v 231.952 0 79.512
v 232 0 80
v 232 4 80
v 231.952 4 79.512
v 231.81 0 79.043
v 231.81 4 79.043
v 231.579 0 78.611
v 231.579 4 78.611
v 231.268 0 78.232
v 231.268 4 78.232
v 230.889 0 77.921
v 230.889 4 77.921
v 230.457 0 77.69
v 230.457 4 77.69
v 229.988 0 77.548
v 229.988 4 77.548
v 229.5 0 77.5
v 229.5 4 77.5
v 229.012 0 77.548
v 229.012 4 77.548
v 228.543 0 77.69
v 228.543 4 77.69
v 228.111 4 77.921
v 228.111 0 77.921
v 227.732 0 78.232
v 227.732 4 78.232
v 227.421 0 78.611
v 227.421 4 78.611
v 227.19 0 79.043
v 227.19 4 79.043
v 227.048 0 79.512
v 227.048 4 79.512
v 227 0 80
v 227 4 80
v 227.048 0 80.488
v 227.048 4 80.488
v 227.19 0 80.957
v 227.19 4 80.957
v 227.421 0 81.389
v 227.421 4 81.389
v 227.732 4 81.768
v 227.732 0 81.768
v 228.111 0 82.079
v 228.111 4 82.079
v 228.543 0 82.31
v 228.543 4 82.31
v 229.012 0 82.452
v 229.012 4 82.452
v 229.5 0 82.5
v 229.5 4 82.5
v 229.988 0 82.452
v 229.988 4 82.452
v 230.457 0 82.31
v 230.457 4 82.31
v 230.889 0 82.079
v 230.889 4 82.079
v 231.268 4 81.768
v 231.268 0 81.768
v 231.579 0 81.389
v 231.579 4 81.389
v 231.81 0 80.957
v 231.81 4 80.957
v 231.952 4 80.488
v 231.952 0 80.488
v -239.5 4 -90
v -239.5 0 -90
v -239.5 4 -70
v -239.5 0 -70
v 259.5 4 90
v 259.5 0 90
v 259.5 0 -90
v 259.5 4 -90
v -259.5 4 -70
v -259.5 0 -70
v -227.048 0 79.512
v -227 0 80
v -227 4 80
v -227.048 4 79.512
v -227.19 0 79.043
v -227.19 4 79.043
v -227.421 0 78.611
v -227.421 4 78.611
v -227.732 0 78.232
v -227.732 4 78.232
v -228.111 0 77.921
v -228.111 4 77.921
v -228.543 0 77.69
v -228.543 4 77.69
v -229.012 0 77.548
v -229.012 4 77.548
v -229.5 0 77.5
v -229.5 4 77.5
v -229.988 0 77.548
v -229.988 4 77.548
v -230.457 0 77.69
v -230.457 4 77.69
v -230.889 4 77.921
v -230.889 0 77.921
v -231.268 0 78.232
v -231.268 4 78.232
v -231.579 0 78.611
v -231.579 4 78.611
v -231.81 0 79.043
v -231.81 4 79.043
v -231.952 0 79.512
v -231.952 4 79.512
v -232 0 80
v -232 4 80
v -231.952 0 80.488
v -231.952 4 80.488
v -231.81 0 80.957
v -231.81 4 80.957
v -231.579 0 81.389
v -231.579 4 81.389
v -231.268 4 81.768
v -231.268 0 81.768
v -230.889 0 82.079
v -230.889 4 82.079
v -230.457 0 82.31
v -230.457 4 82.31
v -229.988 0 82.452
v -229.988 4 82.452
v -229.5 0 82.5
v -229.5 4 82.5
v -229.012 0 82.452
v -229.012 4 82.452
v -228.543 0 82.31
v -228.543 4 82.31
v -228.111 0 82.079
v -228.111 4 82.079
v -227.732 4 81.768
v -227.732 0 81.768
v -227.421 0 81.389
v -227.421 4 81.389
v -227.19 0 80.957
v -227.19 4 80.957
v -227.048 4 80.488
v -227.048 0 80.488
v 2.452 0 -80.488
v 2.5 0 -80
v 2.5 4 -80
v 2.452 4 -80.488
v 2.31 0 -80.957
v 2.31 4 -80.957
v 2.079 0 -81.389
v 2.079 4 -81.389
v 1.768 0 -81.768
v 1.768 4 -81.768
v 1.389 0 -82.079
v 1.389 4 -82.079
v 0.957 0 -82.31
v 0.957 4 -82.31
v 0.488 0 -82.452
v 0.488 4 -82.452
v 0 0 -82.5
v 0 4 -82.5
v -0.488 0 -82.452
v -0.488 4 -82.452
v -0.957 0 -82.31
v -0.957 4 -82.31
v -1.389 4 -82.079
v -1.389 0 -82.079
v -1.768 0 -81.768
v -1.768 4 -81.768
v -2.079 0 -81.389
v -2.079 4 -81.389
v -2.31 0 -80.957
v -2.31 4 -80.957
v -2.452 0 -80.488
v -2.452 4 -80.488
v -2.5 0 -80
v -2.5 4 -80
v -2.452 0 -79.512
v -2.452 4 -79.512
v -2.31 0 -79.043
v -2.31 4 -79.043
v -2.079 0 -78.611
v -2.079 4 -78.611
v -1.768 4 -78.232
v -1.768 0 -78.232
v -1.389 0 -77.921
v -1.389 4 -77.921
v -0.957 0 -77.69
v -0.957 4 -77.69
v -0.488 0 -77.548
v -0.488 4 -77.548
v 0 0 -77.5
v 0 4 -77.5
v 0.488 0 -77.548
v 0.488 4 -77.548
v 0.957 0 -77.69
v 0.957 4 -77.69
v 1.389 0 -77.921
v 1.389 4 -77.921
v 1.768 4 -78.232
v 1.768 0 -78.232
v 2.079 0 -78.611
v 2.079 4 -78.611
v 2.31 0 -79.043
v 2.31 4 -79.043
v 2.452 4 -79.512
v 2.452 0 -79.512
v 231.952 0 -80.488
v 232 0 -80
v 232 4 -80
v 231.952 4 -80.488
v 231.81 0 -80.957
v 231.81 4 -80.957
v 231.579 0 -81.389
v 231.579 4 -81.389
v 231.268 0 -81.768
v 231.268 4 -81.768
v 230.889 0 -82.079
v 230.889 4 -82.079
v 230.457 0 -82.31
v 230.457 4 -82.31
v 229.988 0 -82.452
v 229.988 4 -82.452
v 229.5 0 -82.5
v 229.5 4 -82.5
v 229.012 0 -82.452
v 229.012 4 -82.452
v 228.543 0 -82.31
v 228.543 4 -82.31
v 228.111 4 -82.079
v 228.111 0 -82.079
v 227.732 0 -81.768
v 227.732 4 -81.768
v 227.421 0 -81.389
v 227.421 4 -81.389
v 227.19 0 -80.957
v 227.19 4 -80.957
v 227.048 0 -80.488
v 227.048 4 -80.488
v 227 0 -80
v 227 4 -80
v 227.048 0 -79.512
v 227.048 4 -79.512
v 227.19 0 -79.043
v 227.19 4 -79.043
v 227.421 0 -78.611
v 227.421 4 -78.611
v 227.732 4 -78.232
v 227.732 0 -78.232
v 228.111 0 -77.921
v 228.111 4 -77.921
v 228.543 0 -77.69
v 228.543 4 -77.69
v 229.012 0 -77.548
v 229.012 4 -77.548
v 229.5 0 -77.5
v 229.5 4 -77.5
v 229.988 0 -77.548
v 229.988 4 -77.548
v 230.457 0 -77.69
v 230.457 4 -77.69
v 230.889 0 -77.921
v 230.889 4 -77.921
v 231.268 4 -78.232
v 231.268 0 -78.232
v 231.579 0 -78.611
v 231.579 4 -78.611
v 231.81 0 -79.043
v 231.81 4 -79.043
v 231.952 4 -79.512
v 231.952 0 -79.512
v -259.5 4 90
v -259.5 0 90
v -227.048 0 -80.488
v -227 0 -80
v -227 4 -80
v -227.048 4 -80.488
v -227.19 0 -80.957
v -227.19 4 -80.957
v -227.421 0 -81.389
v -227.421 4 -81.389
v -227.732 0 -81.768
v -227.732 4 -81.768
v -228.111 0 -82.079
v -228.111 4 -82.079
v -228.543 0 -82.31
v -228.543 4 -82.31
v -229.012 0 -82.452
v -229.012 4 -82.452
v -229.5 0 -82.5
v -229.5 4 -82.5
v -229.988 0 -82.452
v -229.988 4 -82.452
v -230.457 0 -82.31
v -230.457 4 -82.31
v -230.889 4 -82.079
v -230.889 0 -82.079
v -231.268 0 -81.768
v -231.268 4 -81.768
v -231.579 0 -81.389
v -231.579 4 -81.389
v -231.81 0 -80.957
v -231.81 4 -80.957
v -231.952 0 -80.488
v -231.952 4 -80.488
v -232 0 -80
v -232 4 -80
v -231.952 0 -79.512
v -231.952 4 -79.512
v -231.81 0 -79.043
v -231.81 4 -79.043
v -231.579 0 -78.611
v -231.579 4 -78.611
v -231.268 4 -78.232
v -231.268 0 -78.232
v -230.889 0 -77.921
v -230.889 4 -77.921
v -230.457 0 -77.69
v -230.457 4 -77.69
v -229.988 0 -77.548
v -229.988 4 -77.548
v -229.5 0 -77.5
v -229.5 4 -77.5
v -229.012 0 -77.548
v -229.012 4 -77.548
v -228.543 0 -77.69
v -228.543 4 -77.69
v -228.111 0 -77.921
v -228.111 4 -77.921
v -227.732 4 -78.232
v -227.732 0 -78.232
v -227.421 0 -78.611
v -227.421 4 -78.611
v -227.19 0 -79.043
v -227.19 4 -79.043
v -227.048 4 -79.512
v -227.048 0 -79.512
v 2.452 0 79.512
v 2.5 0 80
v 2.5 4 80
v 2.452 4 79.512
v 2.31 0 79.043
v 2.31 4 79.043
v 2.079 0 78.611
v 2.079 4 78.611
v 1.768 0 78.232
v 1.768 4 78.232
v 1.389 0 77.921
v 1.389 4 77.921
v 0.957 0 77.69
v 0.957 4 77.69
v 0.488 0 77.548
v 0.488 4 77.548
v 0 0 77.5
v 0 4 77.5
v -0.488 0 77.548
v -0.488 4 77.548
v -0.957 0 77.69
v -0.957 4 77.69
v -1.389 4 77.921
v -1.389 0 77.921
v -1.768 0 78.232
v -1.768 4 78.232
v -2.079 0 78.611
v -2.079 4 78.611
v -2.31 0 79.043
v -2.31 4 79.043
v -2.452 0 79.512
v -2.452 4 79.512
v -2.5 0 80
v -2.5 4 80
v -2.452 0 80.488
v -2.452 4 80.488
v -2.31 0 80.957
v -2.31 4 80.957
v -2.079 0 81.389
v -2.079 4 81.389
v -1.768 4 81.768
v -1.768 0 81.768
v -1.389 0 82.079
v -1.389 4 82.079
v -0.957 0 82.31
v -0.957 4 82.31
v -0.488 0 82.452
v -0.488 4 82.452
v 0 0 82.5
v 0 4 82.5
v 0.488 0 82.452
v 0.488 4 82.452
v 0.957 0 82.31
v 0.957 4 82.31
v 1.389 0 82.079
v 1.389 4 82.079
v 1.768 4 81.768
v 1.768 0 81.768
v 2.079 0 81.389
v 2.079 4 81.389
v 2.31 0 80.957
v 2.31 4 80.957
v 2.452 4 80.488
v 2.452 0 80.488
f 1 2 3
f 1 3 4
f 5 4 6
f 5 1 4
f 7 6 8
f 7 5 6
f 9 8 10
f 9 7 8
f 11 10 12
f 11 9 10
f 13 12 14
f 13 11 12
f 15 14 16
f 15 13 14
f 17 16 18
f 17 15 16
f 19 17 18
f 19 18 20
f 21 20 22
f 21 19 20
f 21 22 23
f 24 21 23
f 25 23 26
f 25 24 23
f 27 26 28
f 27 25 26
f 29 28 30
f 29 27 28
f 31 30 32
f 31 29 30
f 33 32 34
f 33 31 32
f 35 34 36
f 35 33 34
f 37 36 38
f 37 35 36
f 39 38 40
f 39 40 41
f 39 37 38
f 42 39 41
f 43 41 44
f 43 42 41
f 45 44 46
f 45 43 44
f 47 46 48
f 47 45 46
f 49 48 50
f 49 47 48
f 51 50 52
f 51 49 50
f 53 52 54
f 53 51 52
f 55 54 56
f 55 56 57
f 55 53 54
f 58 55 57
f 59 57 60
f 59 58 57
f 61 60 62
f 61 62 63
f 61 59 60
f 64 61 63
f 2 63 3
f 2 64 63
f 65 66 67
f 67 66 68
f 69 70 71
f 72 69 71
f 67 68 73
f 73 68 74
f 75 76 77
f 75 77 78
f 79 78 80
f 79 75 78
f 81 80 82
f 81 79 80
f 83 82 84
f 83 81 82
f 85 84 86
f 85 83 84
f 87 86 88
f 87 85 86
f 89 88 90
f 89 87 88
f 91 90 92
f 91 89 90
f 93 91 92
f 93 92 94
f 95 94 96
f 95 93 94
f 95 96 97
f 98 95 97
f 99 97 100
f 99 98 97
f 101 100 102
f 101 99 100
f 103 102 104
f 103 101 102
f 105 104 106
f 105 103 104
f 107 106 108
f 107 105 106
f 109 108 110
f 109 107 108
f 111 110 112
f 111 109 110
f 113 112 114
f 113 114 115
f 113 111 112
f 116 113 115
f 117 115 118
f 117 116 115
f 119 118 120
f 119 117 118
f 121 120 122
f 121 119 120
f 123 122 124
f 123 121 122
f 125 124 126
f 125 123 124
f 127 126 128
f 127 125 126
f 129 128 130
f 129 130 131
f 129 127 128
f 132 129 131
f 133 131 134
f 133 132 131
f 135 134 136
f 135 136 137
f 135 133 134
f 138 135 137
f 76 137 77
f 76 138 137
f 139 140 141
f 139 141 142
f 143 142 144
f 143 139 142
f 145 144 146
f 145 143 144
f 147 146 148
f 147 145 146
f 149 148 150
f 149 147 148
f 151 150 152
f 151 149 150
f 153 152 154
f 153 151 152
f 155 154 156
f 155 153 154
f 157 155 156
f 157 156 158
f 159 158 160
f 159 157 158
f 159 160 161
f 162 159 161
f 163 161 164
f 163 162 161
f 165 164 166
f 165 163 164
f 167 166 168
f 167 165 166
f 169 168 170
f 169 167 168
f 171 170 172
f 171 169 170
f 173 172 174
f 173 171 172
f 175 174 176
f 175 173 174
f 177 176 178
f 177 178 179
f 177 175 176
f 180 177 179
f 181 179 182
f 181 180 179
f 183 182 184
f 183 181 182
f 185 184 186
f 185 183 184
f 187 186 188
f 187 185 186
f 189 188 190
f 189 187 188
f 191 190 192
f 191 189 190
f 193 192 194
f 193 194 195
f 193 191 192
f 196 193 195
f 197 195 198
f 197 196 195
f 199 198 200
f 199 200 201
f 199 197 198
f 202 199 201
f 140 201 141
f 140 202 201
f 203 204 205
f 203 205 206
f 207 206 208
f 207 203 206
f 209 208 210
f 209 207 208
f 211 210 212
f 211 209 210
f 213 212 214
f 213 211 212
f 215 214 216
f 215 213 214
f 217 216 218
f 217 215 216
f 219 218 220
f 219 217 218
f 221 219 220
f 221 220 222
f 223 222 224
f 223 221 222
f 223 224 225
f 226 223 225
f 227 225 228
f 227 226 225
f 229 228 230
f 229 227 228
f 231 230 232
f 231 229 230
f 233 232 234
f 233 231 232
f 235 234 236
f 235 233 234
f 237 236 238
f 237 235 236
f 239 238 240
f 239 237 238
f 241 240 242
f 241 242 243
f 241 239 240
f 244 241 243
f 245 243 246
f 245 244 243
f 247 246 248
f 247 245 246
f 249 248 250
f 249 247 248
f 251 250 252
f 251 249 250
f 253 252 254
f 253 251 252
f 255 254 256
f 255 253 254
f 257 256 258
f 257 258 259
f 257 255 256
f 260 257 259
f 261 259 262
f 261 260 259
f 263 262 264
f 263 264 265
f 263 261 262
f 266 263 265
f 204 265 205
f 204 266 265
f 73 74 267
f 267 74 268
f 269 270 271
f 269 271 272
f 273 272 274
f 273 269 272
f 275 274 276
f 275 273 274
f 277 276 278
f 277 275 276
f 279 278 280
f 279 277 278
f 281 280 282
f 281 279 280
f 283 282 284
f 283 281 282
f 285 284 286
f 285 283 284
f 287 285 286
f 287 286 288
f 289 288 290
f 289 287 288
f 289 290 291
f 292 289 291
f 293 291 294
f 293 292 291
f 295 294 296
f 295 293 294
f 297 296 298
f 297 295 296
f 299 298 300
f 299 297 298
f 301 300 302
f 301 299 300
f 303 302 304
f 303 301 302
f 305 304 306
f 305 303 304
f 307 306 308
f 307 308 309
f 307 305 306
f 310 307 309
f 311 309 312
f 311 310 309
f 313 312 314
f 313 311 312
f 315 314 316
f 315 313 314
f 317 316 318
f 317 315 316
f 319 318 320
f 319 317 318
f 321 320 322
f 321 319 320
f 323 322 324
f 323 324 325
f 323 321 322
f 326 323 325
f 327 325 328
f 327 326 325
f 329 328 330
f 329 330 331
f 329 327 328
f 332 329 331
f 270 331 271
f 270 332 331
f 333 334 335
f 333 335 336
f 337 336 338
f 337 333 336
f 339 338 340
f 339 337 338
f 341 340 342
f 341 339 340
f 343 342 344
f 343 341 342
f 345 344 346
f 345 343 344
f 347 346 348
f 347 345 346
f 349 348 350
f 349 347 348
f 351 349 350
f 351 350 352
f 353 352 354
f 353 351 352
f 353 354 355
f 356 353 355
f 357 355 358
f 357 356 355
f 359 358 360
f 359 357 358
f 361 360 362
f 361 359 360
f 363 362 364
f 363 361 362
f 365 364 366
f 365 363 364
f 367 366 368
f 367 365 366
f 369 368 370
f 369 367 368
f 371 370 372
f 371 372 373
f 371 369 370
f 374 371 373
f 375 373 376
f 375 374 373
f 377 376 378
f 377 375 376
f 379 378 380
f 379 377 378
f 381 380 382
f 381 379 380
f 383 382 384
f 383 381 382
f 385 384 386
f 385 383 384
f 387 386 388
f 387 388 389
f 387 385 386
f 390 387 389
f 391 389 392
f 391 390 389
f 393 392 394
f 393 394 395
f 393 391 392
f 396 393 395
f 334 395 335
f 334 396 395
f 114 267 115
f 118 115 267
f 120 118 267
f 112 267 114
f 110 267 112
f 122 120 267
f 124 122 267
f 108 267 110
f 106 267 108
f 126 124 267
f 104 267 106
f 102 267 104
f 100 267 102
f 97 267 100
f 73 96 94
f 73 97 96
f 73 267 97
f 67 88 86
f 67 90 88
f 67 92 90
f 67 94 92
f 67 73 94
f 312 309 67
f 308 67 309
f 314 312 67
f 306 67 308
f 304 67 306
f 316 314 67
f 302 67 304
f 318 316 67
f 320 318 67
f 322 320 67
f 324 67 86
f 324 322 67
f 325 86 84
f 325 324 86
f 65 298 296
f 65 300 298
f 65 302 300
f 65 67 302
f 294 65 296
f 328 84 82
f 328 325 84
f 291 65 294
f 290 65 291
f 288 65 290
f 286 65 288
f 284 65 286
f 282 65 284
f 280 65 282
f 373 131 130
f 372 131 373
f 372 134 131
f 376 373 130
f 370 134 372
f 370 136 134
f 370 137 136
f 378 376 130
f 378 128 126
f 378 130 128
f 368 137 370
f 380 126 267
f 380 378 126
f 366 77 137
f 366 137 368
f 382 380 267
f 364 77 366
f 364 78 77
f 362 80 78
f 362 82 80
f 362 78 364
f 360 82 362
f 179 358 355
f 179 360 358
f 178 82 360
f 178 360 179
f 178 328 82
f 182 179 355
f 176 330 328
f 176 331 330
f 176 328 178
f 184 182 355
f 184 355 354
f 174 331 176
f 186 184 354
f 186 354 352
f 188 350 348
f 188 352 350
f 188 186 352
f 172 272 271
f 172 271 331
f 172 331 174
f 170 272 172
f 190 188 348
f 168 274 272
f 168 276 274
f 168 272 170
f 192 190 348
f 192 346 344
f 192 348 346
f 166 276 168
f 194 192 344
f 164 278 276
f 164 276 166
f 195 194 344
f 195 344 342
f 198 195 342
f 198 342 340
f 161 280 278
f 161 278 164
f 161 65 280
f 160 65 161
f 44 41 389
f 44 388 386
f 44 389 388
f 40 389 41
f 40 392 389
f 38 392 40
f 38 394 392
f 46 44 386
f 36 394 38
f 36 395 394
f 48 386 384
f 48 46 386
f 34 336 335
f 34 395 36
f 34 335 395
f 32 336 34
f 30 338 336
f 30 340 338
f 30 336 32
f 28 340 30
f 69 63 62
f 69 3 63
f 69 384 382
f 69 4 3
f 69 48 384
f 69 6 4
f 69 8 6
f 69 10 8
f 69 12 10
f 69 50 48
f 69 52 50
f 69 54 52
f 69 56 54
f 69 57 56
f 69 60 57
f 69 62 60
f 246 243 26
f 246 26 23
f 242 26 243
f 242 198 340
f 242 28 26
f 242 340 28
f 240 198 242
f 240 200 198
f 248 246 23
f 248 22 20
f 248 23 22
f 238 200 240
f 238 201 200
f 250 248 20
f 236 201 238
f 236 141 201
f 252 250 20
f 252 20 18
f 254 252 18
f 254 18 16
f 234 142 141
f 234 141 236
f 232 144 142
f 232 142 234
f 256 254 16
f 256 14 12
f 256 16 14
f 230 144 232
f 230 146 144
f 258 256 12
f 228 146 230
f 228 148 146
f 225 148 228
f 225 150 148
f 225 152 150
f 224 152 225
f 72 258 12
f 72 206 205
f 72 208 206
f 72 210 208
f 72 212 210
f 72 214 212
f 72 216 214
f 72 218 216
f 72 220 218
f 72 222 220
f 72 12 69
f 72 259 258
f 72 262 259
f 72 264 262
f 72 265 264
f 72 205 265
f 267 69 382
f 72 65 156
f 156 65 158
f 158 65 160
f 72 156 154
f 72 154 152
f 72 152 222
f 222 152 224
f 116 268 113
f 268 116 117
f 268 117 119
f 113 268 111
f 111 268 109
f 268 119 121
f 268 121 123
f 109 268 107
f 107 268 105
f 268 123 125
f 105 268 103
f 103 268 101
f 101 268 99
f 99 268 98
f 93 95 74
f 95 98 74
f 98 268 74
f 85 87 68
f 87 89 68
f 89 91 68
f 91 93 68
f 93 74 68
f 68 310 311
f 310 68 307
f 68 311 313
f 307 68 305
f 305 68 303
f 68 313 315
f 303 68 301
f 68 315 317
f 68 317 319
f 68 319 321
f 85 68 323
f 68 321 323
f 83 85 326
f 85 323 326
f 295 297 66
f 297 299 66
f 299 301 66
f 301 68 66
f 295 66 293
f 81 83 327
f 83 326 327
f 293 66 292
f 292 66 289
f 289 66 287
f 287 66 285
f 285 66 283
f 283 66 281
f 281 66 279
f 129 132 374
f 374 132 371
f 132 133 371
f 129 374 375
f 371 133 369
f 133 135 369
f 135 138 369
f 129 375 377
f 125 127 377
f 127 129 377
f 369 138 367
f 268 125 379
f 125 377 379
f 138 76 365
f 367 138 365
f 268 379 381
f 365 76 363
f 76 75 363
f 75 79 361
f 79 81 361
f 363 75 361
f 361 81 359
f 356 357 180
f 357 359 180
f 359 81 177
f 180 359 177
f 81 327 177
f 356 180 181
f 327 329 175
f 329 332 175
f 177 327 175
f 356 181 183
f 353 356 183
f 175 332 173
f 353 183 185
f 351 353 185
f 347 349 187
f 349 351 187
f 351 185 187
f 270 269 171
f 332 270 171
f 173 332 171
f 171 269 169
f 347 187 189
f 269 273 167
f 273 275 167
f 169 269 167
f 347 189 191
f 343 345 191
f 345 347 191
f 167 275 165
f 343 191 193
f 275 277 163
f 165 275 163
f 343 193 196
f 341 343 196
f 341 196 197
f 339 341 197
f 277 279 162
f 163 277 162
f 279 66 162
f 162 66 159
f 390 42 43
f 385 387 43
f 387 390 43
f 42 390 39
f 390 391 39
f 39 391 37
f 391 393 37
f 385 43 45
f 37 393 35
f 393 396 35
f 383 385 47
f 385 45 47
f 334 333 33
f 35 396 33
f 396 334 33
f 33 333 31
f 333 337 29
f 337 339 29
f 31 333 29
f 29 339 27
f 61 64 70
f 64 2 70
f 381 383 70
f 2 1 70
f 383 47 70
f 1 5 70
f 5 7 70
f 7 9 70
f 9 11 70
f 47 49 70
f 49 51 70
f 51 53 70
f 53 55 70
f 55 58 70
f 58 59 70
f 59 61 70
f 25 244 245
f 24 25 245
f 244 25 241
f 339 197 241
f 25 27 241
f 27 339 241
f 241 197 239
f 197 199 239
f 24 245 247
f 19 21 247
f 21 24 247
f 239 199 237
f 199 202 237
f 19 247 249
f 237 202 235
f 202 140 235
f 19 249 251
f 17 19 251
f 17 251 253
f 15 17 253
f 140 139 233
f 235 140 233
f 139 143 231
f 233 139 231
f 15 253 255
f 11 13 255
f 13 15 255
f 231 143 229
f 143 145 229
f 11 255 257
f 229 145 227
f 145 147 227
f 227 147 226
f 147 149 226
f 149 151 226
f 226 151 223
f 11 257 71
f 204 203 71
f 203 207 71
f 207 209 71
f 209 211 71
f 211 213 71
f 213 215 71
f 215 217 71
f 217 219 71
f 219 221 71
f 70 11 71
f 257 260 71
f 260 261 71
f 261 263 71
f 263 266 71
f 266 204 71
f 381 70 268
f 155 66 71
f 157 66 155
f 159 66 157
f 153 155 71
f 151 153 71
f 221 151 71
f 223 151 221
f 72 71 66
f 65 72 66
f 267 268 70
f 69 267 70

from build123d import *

# Parameters (mm, degrees)
SKETCH1_R           = 2.5
BOSS_EXTRUDE1_DEPTH = 4


with BuildPart() as part:
    # Sketch1 → Boss-Extrude1 (new body)
    with BuildSketch(Plane(origin=(0, 0, 0), x_dir=(1, 0, 0), z_dir=(0, 1, 0))):
        Polygon((-259.5, -90), (259.5, -90), (259.5, 90), (-239.5, 90), (-239.5, 70), (-259.5, 70), align=None)
        with Locations((-229.5, 80)):
            Circle(SKETCH1_R, mode=Mode.SUBTRACT)
        with Locations((229.5, 80)):
            Circle(SKETCH1_R, mode=Mode.SUBTRACT)
        with Locations((-229.5, -80)):
            Circle(SKETCH1_R, mode=Mode.SUBTRACT)
        with Locations((229.5, -80)):
            Circle(SKETCH1_R, mode=Mode.SUBTRACT)
        with Locations((0, 80)):
            Circle(SKETCH1_R, mode=Mode.SUBTRACT)
        with Locations((0, -80)):
            Circle(SKETCH1_R, mode=Mode.SUBTRACT)
    extrude(amount=BOSS_EXTRUDE1_DEPTH)


solid = part.part
